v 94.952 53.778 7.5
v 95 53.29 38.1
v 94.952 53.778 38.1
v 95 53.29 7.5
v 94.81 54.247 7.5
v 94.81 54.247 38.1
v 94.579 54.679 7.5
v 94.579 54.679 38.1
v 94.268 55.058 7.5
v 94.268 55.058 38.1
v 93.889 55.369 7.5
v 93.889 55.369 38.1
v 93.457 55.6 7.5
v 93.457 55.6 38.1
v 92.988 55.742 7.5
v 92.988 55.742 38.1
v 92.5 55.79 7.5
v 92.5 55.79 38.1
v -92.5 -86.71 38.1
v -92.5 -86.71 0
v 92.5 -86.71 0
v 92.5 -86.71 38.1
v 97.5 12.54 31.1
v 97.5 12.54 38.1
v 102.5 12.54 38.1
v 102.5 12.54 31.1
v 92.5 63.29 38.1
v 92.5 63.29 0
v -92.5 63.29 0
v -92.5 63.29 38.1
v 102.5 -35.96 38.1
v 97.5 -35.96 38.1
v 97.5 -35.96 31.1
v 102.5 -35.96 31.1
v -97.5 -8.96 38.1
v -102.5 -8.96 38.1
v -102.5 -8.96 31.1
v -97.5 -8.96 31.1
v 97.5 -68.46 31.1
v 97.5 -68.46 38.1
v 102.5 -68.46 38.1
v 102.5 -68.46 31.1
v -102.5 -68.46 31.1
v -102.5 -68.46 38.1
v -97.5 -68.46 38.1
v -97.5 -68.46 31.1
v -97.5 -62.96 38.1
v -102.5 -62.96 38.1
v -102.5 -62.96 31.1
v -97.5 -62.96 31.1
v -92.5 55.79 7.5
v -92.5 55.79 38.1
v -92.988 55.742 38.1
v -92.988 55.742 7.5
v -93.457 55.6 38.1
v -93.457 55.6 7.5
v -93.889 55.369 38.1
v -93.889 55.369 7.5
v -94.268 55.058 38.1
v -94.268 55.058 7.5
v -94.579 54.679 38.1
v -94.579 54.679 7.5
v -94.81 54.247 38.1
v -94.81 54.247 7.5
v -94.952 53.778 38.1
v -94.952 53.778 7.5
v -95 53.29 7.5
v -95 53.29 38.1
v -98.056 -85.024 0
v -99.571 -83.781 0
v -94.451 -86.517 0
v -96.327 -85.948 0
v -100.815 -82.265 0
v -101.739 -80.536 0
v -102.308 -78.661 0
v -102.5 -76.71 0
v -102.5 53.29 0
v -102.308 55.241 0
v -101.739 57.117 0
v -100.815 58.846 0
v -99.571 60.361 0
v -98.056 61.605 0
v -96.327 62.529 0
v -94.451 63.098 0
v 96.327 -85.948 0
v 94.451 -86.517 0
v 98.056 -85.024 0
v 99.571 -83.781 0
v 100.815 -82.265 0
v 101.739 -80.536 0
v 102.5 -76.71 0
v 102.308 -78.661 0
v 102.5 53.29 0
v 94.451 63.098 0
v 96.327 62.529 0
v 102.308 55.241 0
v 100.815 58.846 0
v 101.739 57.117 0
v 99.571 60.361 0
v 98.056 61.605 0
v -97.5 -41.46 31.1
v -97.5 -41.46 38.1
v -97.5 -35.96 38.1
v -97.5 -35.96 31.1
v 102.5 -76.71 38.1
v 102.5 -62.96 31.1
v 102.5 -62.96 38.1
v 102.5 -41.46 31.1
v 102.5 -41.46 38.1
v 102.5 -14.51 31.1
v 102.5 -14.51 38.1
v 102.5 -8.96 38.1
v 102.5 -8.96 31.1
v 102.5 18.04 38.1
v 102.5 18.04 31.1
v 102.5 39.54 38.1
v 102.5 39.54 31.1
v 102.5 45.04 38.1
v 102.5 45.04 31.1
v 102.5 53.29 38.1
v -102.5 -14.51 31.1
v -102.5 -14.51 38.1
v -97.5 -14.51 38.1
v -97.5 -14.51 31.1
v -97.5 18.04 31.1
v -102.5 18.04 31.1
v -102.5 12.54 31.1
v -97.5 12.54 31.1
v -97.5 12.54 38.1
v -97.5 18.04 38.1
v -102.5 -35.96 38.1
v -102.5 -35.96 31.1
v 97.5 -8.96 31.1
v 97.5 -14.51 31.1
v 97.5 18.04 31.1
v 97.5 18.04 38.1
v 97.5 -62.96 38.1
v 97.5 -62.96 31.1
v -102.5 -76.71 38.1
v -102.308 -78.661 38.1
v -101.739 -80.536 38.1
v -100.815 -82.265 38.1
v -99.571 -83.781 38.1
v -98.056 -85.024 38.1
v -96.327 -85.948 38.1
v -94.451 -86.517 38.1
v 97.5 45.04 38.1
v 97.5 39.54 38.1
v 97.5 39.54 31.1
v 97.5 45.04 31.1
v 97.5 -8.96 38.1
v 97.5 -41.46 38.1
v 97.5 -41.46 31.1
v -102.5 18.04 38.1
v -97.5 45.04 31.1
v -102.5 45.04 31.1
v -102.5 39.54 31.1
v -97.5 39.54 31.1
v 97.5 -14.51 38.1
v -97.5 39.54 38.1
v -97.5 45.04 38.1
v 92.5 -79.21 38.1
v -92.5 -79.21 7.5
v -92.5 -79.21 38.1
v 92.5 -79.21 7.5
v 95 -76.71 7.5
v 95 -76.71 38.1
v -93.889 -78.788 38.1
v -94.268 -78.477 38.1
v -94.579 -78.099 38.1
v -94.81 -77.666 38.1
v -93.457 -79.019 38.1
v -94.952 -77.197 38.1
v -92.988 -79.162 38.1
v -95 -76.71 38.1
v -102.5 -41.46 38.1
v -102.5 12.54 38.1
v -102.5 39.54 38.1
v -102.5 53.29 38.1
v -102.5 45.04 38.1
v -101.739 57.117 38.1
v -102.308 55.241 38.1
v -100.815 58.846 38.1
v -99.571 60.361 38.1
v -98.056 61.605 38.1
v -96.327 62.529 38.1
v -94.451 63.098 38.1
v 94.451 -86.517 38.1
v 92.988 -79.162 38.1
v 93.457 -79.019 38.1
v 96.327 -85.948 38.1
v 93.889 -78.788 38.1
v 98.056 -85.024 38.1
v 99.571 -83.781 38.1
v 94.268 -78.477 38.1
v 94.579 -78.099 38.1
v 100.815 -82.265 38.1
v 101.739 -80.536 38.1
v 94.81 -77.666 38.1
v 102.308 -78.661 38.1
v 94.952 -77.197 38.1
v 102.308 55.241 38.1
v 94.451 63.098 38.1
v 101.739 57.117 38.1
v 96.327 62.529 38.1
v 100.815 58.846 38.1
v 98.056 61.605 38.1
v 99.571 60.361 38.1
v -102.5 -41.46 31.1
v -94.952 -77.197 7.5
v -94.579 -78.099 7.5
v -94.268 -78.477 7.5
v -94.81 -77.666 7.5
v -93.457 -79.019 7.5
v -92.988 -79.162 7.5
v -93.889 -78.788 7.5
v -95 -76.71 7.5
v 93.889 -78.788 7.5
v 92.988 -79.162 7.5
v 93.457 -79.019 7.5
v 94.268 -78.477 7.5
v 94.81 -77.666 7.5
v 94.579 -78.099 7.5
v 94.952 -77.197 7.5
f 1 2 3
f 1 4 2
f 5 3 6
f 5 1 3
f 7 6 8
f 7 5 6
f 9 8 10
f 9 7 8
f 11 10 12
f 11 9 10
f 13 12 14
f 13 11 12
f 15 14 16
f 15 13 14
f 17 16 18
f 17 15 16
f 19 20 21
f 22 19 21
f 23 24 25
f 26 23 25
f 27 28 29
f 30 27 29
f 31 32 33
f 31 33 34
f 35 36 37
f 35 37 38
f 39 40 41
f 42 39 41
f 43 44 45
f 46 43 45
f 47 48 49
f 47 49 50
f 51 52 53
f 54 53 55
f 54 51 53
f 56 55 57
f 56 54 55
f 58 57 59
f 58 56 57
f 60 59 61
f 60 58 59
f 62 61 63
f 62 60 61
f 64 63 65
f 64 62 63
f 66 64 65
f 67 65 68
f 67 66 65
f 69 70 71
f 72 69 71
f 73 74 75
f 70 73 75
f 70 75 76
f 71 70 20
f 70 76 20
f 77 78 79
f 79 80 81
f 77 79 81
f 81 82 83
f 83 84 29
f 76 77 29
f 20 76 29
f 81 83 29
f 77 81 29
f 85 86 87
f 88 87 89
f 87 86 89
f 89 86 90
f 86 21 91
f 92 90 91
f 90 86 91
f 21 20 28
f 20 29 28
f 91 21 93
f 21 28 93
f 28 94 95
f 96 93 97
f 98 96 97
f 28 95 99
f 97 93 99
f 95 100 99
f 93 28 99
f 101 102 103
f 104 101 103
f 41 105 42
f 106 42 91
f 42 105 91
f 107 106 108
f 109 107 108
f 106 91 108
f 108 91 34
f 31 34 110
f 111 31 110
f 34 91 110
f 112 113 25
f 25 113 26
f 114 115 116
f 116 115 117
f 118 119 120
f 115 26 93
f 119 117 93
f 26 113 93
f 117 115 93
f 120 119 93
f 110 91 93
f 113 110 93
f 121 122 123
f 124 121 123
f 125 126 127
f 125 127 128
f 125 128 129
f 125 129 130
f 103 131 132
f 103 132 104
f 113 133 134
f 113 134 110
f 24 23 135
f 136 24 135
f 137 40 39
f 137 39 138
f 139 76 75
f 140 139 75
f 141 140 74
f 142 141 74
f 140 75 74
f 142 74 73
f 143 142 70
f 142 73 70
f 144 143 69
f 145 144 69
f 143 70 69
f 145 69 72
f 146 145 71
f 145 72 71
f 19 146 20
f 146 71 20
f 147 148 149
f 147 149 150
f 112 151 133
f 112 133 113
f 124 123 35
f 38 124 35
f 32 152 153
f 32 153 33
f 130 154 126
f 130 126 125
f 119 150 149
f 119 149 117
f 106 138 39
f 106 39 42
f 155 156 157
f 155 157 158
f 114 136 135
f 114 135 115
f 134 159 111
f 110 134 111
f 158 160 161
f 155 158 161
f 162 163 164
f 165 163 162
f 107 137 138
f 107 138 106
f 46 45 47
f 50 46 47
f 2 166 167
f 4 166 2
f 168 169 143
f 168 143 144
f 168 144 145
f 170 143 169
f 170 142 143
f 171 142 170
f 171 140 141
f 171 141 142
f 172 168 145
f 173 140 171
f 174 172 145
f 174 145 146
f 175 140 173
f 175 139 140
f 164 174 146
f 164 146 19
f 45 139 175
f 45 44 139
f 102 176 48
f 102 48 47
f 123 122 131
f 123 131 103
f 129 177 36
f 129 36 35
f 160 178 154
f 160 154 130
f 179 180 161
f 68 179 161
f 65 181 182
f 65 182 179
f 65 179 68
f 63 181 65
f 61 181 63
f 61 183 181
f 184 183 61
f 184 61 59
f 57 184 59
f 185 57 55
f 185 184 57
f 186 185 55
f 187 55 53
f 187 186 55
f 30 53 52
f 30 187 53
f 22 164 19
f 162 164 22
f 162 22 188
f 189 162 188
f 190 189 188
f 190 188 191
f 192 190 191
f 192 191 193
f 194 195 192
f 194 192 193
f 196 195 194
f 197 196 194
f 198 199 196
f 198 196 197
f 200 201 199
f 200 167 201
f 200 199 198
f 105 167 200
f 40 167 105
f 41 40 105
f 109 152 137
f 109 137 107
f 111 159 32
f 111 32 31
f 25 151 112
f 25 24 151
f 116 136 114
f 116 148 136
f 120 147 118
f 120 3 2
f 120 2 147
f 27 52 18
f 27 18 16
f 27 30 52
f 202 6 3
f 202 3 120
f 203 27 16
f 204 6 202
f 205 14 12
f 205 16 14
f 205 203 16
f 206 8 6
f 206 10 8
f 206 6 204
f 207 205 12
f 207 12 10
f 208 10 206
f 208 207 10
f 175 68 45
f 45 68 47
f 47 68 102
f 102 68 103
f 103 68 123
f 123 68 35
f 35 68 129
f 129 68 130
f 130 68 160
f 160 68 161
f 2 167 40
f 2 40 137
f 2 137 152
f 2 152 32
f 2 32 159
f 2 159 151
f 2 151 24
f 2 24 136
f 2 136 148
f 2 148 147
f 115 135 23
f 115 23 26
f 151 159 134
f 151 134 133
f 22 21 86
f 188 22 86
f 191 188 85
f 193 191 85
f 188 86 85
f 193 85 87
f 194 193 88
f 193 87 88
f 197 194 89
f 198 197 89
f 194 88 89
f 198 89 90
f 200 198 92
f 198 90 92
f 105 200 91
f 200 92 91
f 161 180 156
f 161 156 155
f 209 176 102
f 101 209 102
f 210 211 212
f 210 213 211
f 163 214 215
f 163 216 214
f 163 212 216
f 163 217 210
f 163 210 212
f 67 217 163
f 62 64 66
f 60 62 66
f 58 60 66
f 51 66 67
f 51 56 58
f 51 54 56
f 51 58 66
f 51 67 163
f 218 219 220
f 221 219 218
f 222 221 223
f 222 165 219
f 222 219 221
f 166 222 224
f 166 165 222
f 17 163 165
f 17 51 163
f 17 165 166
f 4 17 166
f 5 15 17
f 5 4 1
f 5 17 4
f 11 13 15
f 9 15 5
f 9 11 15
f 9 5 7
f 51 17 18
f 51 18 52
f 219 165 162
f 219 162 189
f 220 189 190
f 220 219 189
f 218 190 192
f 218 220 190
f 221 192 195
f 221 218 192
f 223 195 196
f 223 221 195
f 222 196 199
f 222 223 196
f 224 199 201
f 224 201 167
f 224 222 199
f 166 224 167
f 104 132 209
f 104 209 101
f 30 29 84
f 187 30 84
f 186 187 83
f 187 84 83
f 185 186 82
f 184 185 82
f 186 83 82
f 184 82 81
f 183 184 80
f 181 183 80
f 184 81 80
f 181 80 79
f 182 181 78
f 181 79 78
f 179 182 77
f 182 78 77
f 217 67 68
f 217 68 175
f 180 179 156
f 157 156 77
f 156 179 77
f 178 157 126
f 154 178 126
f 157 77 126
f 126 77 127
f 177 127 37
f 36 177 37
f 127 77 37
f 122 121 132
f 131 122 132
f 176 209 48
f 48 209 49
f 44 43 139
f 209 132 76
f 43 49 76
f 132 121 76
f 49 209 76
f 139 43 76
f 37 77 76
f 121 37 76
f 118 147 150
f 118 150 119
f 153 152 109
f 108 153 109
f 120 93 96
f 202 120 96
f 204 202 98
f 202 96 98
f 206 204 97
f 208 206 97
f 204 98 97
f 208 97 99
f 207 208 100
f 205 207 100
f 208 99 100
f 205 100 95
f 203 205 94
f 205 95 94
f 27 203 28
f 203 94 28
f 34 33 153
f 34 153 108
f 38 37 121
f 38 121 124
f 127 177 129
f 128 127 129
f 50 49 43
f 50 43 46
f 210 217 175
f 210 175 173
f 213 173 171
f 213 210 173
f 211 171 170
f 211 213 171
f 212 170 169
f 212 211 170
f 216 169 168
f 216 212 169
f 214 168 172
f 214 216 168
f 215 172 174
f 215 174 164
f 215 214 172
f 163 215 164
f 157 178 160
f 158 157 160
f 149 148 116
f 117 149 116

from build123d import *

# Parameters (mm, degrees)
F1_DEPTH = 38.1
F2_T     = -7.5
F3_W     = 5
F3_H     = 5.5
F3_H_2   = 5.55
F4_DEPTH = 7


with BuildPart() as f1:
    # F0 (on Top) → F1 (new body)
    with BuildSketch(Plane.XY):
        with BuildLine():
            Line((92.5, 63.290403), (-92.5, 63.290403))
            ThreePointArc((-92.5, 63.290403), (-99.571068, 60.361471), (-102.5, 53.290403))
            Line((-102.5, 53.290403), (-102.5, -76.709597))
            ThreePointArc((-102.5, -76.709597), (-99.571068, -83.780664), (-92.5, -86.709597))
            Line((-92.5, -86.709597), (92.5, -86.709597))
            ThreePointArc((92.5, -86.709597), (99.571068, -83.780664), (102.5, -76.709597))
            Line((102.5, -76.709597), (102.5, 53.290403))
            ThreePointArc((102.5, 53.290403), (99.571068, 60.361471), (92.5, 63.290403))
        make_face()
    extrude(amount=F1_DEPTH)

    # F2
    f2_openings = [f1.faces().sort_by_distance(p)[0] for p in [
        (0, -11.709597, 38.1),
    ]]
    offset(amount=F2_T, openings=f2_openings)

    # F3 (on face) → F4 (cut)
    with BuildSketch(Plane.XY.offset(38.1)):
        with Locations((-100, 42.290403)):
            Rectangle(F3_W, F3_H)
        with Locations((-100, 15.290403)):
            Rectangle(F3_W, F3_H)
        with Locations((-100, -11.734597)):
            Rectangle(F3_W, F3_H_2)
        with Locations((-100, -38.709597)):
            Rectangle(F3_W, F3_H)
        with Locations((-100, -65.709597)):
            Rectangle(F3_W, F3_H)
        with Locations((100, -65.709597)):
            Rectangle(F3_W, F3_H)
        with Locations((100, -38.709597)):
            Rectangle(F3_W, F3_H)
        with Locations((100, -11.734597)):
            Rectangle(F3_W, F3_H_2)
        with Locations((100, 15.290403)):
            Rectangle(F3_W, F3_H)
        with Locations((100, 42.290403)):
            Rectangle(F3_W, F3_H)
    extrude(amount=-F4_DEPTH, mode=Mode.SUBTRACT)


solid = f1.part
